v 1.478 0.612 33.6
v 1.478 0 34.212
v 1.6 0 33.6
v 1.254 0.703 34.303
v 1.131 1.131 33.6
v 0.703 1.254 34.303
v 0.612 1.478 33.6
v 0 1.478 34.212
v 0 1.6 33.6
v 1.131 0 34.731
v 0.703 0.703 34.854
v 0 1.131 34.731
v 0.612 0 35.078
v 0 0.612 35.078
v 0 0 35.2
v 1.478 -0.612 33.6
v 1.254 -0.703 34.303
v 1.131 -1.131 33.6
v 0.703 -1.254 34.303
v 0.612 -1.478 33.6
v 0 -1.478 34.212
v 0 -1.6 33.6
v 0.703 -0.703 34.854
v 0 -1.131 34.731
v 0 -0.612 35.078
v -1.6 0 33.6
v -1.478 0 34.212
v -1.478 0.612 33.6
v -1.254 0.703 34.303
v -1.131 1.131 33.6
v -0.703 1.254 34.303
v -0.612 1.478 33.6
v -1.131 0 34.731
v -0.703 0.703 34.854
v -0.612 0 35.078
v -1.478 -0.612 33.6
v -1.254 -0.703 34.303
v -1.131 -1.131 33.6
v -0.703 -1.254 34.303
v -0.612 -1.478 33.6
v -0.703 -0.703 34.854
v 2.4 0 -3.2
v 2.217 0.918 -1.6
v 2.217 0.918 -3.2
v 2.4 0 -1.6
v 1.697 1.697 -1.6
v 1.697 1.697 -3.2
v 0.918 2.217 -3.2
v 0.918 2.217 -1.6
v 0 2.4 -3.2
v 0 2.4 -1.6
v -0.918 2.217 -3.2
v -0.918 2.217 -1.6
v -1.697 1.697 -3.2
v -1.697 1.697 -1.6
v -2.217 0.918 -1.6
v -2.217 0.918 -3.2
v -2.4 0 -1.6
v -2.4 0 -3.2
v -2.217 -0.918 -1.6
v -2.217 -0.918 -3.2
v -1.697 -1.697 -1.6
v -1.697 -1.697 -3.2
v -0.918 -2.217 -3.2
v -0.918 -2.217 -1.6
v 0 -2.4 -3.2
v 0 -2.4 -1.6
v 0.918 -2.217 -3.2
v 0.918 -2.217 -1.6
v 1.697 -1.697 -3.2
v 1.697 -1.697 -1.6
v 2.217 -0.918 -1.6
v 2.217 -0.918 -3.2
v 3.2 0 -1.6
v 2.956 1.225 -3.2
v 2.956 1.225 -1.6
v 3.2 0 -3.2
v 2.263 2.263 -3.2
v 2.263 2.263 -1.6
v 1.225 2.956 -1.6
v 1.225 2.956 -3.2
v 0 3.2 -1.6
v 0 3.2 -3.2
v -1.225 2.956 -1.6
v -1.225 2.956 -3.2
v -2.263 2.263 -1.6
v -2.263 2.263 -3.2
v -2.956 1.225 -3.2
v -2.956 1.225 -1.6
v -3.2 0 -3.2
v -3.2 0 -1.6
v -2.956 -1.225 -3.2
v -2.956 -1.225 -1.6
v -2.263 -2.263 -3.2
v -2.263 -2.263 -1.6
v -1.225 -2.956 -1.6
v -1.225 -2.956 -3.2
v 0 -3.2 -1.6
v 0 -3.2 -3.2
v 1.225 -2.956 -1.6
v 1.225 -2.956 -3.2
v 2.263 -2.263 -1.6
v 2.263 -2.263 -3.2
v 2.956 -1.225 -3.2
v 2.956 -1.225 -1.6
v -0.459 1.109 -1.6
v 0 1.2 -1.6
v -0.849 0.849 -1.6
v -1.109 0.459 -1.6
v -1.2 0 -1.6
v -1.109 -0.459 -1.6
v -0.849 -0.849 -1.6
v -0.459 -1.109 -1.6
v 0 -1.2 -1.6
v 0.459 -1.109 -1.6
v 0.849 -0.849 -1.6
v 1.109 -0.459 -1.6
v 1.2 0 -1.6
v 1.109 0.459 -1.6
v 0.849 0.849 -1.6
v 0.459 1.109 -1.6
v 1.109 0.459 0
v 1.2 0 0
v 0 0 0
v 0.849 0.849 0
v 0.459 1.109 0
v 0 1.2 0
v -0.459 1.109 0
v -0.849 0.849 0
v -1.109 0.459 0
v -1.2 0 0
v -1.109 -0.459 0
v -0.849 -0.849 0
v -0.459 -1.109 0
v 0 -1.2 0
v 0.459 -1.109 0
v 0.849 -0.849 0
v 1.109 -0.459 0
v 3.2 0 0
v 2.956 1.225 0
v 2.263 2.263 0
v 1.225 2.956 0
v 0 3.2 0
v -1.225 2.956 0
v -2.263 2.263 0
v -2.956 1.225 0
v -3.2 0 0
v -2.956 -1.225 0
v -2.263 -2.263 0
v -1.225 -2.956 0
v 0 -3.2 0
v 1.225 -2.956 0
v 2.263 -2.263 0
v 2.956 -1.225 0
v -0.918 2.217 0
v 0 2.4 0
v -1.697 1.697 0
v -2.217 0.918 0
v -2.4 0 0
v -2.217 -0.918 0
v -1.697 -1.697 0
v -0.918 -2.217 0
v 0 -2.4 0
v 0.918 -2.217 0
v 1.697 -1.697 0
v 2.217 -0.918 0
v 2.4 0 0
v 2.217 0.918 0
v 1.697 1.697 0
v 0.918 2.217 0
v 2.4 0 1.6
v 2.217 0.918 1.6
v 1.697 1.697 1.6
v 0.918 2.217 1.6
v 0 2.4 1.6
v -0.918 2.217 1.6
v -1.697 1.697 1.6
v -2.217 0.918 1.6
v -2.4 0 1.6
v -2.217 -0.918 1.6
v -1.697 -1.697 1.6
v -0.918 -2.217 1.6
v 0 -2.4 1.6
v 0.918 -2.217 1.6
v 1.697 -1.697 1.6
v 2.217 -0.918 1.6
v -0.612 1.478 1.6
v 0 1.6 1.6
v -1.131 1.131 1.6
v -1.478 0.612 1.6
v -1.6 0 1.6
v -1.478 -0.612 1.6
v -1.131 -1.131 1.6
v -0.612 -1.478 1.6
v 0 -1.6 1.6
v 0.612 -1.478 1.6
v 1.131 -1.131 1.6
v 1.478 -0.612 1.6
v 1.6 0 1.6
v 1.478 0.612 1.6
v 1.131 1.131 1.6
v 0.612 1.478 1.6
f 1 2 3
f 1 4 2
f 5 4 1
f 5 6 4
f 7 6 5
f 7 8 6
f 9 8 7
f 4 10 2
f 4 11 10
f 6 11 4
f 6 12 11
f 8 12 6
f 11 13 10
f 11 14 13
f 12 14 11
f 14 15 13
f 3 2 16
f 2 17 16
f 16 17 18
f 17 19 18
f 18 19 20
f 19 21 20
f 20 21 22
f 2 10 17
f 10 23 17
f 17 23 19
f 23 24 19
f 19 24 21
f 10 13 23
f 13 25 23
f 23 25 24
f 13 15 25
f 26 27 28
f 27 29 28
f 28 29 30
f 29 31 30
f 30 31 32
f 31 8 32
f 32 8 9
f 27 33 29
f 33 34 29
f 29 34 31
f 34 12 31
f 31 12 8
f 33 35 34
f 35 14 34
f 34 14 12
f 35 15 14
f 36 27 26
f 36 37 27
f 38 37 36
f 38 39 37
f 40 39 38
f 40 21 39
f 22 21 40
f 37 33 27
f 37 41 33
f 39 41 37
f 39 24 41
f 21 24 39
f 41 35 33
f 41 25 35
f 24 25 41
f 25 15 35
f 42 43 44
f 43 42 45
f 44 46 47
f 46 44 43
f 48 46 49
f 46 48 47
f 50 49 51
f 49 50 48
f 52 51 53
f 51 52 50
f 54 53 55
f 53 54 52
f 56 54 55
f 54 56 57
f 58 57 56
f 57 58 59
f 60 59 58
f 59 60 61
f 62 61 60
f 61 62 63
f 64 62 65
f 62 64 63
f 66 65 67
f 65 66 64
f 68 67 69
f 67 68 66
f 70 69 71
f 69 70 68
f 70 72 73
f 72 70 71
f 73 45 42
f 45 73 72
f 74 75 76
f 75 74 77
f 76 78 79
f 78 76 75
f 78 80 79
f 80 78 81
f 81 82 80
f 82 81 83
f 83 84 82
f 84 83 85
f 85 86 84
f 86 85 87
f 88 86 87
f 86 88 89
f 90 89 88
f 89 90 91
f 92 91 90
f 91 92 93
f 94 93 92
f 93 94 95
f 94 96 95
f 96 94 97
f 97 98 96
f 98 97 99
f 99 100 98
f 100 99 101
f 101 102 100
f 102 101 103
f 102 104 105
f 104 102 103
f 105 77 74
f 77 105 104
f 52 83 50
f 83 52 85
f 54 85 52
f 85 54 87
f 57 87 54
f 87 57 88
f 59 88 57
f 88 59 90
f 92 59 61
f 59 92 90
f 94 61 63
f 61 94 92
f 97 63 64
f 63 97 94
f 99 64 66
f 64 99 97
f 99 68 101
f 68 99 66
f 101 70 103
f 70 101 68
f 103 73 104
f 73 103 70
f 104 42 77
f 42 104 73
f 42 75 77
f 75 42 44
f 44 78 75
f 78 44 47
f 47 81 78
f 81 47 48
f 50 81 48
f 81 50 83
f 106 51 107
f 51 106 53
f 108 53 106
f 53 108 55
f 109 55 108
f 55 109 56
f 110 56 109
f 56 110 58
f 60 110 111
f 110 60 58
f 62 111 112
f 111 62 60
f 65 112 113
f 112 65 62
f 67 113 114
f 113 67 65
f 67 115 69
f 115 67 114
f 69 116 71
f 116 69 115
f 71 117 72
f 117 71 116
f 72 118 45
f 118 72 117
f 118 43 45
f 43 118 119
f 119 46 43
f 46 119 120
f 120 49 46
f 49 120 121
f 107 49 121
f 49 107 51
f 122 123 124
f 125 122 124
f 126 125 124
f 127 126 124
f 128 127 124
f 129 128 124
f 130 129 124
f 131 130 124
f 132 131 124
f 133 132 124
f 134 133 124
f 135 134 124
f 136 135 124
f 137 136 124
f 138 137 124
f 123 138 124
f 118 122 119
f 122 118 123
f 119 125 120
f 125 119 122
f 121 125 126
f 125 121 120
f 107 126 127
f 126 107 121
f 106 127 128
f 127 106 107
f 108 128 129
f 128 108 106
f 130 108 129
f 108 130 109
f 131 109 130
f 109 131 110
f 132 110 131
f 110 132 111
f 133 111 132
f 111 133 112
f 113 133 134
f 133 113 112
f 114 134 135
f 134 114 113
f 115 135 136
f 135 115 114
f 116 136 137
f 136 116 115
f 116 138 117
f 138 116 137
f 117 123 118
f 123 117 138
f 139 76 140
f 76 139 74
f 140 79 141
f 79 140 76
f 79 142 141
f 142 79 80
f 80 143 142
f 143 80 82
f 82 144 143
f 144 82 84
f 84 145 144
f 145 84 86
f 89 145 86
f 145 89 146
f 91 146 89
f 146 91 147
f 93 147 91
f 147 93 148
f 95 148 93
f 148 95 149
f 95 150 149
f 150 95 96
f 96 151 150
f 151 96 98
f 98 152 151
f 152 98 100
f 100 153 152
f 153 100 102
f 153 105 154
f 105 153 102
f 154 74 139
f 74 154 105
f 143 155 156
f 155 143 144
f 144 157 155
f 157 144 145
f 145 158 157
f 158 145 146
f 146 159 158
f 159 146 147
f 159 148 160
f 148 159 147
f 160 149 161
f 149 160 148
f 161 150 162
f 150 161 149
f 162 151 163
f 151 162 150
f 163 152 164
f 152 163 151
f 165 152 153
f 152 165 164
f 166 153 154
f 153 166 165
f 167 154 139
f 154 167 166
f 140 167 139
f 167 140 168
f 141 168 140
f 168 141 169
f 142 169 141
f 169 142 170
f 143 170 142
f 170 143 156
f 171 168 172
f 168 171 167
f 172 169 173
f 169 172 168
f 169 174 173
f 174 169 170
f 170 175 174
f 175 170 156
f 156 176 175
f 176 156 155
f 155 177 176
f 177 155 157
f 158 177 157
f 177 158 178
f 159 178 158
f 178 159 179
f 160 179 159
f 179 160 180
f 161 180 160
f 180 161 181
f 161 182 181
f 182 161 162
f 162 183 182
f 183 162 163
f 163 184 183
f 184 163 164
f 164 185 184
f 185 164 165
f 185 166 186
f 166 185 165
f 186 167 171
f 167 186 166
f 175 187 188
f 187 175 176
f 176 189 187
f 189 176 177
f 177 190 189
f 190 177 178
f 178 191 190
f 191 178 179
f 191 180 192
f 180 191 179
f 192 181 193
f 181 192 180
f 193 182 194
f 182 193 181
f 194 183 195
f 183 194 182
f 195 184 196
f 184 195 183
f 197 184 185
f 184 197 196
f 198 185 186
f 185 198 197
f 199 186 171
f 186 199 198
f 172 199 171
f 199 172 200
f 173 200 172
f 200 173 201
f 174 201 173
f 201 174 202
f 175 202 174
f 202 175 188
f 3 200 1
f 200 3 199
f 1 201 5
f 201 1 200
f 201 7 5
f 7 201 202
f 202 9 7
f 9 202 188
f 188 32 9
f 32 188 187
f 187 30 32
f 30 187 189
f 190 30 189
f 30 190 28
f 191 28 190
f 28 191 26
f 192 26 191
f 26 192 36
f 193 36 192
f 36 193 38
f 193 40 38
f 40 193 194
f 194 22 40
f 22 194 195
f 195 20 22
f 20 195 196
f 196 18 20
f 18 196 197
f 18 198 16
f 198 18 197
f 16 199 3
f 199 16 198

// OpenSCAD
// file: ../p/1-8sphe.scad
use <../lib.scad>
function ldraw_lib__1_8sphe() = [
// 0 Sphere 0.125
// 0 Name: 1-8sphe.dat
// 0 Author: James Jessiman
// 0 !LDRAW_ORG Primitive UPDATE 2012-03
// 0 !LICENSE Licensed under CC BY 2.0 and CC BY 4.0 : see CAreadme.txt
// 
// 0 BFC CERTIFY CCW
  [0,"BFC","CERTIFY"],
  [0,"BFC","CCW"],
// 
// 0 !HISTORY 2000-08-01 {Axel Poque} fixes to resolve L3P error messages.
// 0 !HISTORY 2000-08-01 {Manfred Moolhuysen} fixes to resolve L3P error messages.
// 0 !HISTORY 2000-09-30 [PTadmin] Official Update 2000-02
// 0 !HISTORY 2002-03-28 [hafhead] Made BFC compliant
// 0 !HISTORY 2002-04-25 [PTadmin] Official Update 2002-02
// 0 !HISTORY 2007-06-22 [PTadmin] Header formatted for Contributor Agreement
// 0 !HISTORY 2008-07-01 [PTadmin] Official Update 2008-01
// 0 !HISTORY 2010-09-12 [MagFors] Changed winding, removed duplicated cond-line, optimized filesize
// 0 !HISTORY 2010-12-31 [PTadmin] Official Update 2010-03
// 0 !HISTORY 2012-07-01 [tcobbs] Replaced with geometry from LDView
// 0 !HISTORY 2012-12-28 [PTadmin] Official Update 2012-03
// 
// 
// 3 16 1 0 0 0.9239 0.3827 0 0.9239 0 0.3827
  [3,16,1,0,0,0.9239,0.3827,0,0.9239,0,0.3827],
// 3 16 0.9239 0.3827 0 0.7836 0.4393 0.4393 0.9239 0 0.3827
  [3,16,0.9239,0.3827,0,0.7836,0.4393,0.4393,0.9239,0,0.3827],
// 3 16 0.9239 0 0.3827 0.7836 0.4393 0.4393 0.7071 0 0.7071
  [3,16,0.9239,0,0.3827,0.7836,0.4393,0.4393,0.7071,0,0.7071],
// 3 16 0.7836 0.4393 0.4393 0.4393 0.4393 0.7836 0.7071 0 0.7071
  [3,16,0.7836,0.4393,0.4393,0.4393,0.4393,0.7836,0.7071,0,0.7071],
// 3 16 0.7071 0 0.7071 0.4393 0.4393 0.7836 0.3827 0 0.9239
  [3,16,0.7071,0,0.7071,0.4393,0.4393,0.7836,0.3827,0,0.9239],
// 3 16 0.4393 0.4393 0.7836 0 0.3827 0.9239 0.3827 0 0.9239
  [3,16,0.4393,0.4393,0.7836,0,0.3827,0.9239,0.3827,0,0.9239],
// 3 16 0.3827 0 0.9239 0 0.3827 0.9239 0 0 1
  [3,16,0.3827,0,0.9239,0,0.3827,0.9239,0,0,1],
// 3 16 0.9239 0.3827 0 0.7071 0.7071 0 0.7836 0.4393 0.4393
  [3,16,0.9239,0.3827,0,0.7071,0.7071,0,0.7836,0.4393,0.4393],
// 3 16 0.7071 0.7071 0 0.4393 0.7836 0.4393 0.7836 0.4393 0.4393
  [3,16,0.7071,0.7071,0,0.4393,0.7836,0.4393,0.7836,0.4393,0.4393],
// 3 16 0.7836 0.4393 0.4393 0.4393 0.7836 0.4393 0.4393 0.4393 0.7836
  [3,16,0.7836,0.4393,0.4393,0.4393,0.7836,0.4393,0.4393,0.4393,0.7836],
// 3 16 0.4393 0.7836 0.4393 0 0.7071 0.7071 0.4393 0.4393 0.7836
  [3,16,0.4393,0.7836,0.4393,0,0.7071,0.7071,0.4393,0.4393,0.7836],
// 3 16 0.4393 0.4393 0.7836 0 0.7071 0.7071 0 0.3827 0.9239
  [3,16,0.4393,0.4393,0.7836,0,0.7071,0.7071,0,0.3827,0.9239],
// 3 16 0.7071 0.7071 0 0.3827 0.9239 0 0.4393 0.7836 0.4393
  [3,16,0.7071,0.7071,0,0.3827,0.9239,0,0.4393,0.7836,0.4393],
// 3 16 0.3827 0.9239 0 0 0.9239 0.3827 0.4393 0.7836 0.4393
  [3,16,0.3827,0.9239,0,0,0.9239,0.3827,0.4393,0.7836,0.4393],
// 3 16 0.4393 0.7836 0.4393 0 0.9239 0.3827 0 0.7071 0.7071
  [3,16,0.4393,0.7836,0.4393,0,0.9239,0.3827,0,0.7071,0.7071],
// 3 16 0.3827 0.9239 0 0 1 0 0 0.9239 0.3827
  [3,16,0.3827,0.9239,0,0,1,0,0,0.9239,0.3827],
// 
// 5 24 1 0 0 0.9239 0.3827 0 1 0 -0.1 0.9239 0 0.3827
  [5,24,1,0,0,0.9239,0.3827,0,1,0,-0.1,0.9239,0,0.3827],
// 5 24 0.9239 0.3827 0 0.9239 0 0.3827 1 0 0 0.7836 0.4393 0.4393
  [5,24,0.9239,0.3827,0,0.9239,0,0.3827,1,0,0,0.7836,0.4393,0.4393],
// 5 24 1 0 0 0.9239 0 0.3827 0.9239 0.3827 0 1 -0.1 0
  [5,24,1,0,0,0.9239,0,0.3827,0.9239,0.3827,0,1,-0.1,0],
// 5 24 0.9239 0 0.3827 0.7836 0.4393 0.4393 0.9239 0.3827 0 0.7071 0 0.7071
  [5,24,0.9239,0,0.3827,0.7836,0.4393,0.4393,0.9239,0.3827,0,0.7071,0,0.7071],
// 5 24 0.7836 0.4393 0.4393 0.7071 0 0.7071 0.9239 0 0.3827 0.4393 0.4393 0.7836
  [5,24,0.7836,0.4393,0.4393,0.7071,0,0.7071,0.9239,0,0.3827,0.4393,0.4393,0.7836],
// 5 24 0.9239 0 0.3827 0.7071 0 0.7071 0.7836 0.4393 0.4393 0.9239 -0.1 0.3827
  [5,24,0.9239,0,0.3827,0.7071,0,0.7071,0.7836,0.4393,0.4393,0.9239,-0.1,0.3827],
// 5 24 0.7071 0 0.7071 0.4393 0.4393 0.7836 0.7836 0.4393 0.4393 0.3827 0 0.9239
  [5,24,0.7071,0,0.7071,0.4393,0.4393,0.7836,0.7836,0.4393,0.4393,0.3827,0,0.9239],
// 5 24 0.4393 0.4393 0.7836 0.3827 0 0.9239 0.7071 0 0.7071 0 0.3827 0.9239
  [5,24,0.4393,0.4393,0.7836,0.3827,0,0.9239,0.7071,0,0.7071,0,0.3827,0.9239],
// 5 24 0.7071 0 0.7071 0.3827 0 0.9239 0.4393 0.4393 0.7836 0.7071 -0.1 0.7071
  [5,24,0.7071,0,0.7071,0.3827,0,0.9239,0.4393,0.4393,0.7836,0.7071,-0.1,0.7071],
// 5 24 0.3827 0 0.9239 0 0.3827 0.9239 0.4393 0.4393 0.7836 0 0 1
  [5,24,0.3827,0,0.9239,0,0.3827,0.9239,0.4393,0.4393,0.7836,0,0,1],
// 5 24 0 0.3827 0.9239 0 0 1 0.3827 0 0.9239 -0.1 0.3827 0.9239
  [5,24,0,0.3827,0.9239,0,0,1,0.3827,0,0.9239,-0.1,0.3827,0.9239],
// 5 24 0.3827 0 0.9239 0 0 1 0 0.3827 0.9239 0.3827 -0.1 0.9239
  [5,24,0.3827,0,0.9239,0,0,1,0,0.3827,0.9239,0.3827,-0.1,0.9239],
// 5 24 0.9239 0.3827 0 0.7071 0.7071 0 0.9239 0.3827 -0.1 0.7836 0.4393 0.4393
  [5,24,0.9239,0.3827,0,0.7071,0.7071,0,0.9239,0.3827,-0.1,0.7836,0.4393,0.4393],
// 5 24 0.7071 0.7071 0 0.7836 0.4393 0.4393 0.9239 0.3827 0 0.4393 0.7836 0.4393
  [5,24,0.7071,0.7071,0,0.7836,0.4393,0.4393,0.9239,0.3827,0,0.4393,0.7836,0.4393],
// 5 24 0.9239 0.3827 0 0.7836 0.4393 0.4393 0.7071 0.7071 0 0.9239 0 0.3827
  [5,24,0.9239,0.3827,0,0.7836,0.4393,0.4393,0.7071,0.7071,0,0.9239,0,0.3827],
// 5 24 0.7836 0.4393 0.4393 0.4393 0.7836 0.4393 0.7071 0.7071 0 0.4393 0.4393 0.7836
  [5,24,0.7836,0.4393,0.4393,0.4393,0.7836,0.4393,0.7071,0.7071,0,0.4393,0.4393,0.7836],
// 5 24 0.4393 0.7836 0.4393 0.4393 0.4393 0.7836 0.7836 0.4393 0.4393 0 0.7071 0.7071
  [5,24,0.4393,0.7836,0.4393,0.4393,0.4393,0.7836,0.7836,0.4393,0.4393,0,0.7071,0.7071],
// 5 24 0.7836 0.4393 0.4393 0.4393 0.4393 0.7836 0.4393 0.7836 0.4393 0.7071 0 0.7071
  [5,24,0.7836,0.4393,0.4393,0.4393,0.4393,0.7836,0.4393,0.7836,0.4393,0.7071,0,0.7071],
// 5 24 0.4393 0.4393 0.7836 0 0.7071 0.7071 0.4393 0.7836 0.4393 0 0.3827 0.9239
  [5,24,0.4393,0.4393,0.7836,0,0.7071,0.7071,0.4393,0.7836,0.4393,0,0.3827,0.9239],
// 5 24 0 0.7071 0.7071 0 0.3827 0.9239 0.4393 0.4393 0.7836 -0.1 0.7071 0.7071
  [5,24,0,0.7071,0.7071,0,0.3827,0.9239,0.4393,0.4393,0.7836,-0.1,0.7071,0.7071],
// 5 24 0.4393 0.4393 0.7836 0 0.3827 0.9239 0 0.7071 0.7071 0.3827 0 0.9239
  [5,24,0.4393,0.4393,0.7836,0,0.3827,0.9239,0,0.7071,0.7071,0.3827,0,0.9239],
// 5 24 0.7071 0.7071 0 0.3827 0.9239 0 0.7071 0.7071 -0.1 0.4393 0.7836 0.4393
  [5,24,0.7071,0.7071,0,0.3827,0.9239,0,0.7071,0.7071,-0.1,0.4393,0.7836,0.4393],
// 5 24 0.3827 0.9239 0 0.4393 0.7836 0.4393 0.7071 0.7071 0 0 0.9239 0.3827
  [5,24,0.3827,0.9239,0,0.4393,0.7836,0.4393,0.7071,0.7071,0,0,0.9239,0.3827],
// 5 24 0.7071 0.7071 0 0.4393 0.7836 0.4393 0.3827 0.9239 0 0.7836 0.4393 0.4393
  [5,24,0.7071,0.7071,0,0.4393,0.7836,0.4393,0.3827,0.9239,0,0.7836,0.4393,0.4393],
// 5 24 0.4393 0.7836 0.4393 0 0.9239 0.3827 0.3827 0.9239 0 0 0.7071 0.7071
  [5,24,0.4393,0.7836,0.4393,0,0.9239,0.3827,0.3827,0.9239,0,0,0.7071,0.7071],
// 5 24 0 0.9239 0.3827 0 0.7071 0.7071 0.4393 0.7836 0.4393 -0.1 0.9239 0.3827
  [5,24,0,0.9239,0.3827,0,0.7071,0.7071,0.4393,0.7836,0.4393,-0.1,0.9239,0.3827],
// 5 24 0.4393 0.7836 0.4393 0 0.7071 0.7071 0 0.9239 0.3827 0.4393 0.4393 0.7836
  [5,24,0.4393,0.7836,0.4393,0,0.7071,0.7071,0,0.9239,0.3827,0.4393,0.4393,0.7836],
// 5 24 0.3827 0.9239 0 0 1 0 0.3827 0.9239 -0.1 0 0.9239 0.3827
  [5,24,0.3827,0.9239,0,0,1,0,0.3827,0.9239,-0.1,0,0.9239,0.3827],
// 5 24 0 1 0 0 0.9239 0.3827 0.3827 0.9239 0 -0.1 1 0
  [5,24,0,1,0,0,0.9239,0.3827,0.3827,0.9239,0,-0.1,1,0],
// 5 24 0.3827 0.9239 0 0 0.9239 0.3827 0 1 0 0.4393 0.7836 0.4393
  [5,24,0.3827,0.9239,0,0,0.9239,0.3827,0,1,0,0.4393,0.7836,0.4393],
];
makepoly(ldraw_lib__1_8sphe(), line=0.2);
// file: ../p/4-4disc.scad
use <../lib.scad>
function ldraw_lib__4_4disc() = [
// 0 Disc 1.0
// 0 Name: 4-4disc.dat
// 0 Author: James Jessiman
// 0 !LDRAW_ORG Primitive UPDATE 2002-02
// 0 !LICENSE Licensed under CC BY 2.0 and CC BY 4.0 : see CAreadme.txt
// 
// 0 BFC CERTIFY CCW
  [0,"BFC","CERTIFY"],
  [0,"BFC","CCW"],
// 
// 0 !HISTORY 1998-12-15 [PTadmin] Official Update 1998-10
// 0 !HISTORY 2002-03-23 [sbliss] Added BFC statement
// 0 !HISTORY 2002-04-25 [PTadmin] Official Update 2002-02
// 0 !HISTORY 2007-06-24 [PTadmin] Header formatted for Contributor Agreement
// 0 !HISTORY 2008-07-01 [PTadmin] Official Update 2008-01
// 
// 
// 3 16 0 0 0 1 0 0 0.9239 0 0.3827
  [3,16,0,0,0,1,0,0,0.9239,0,0.3827],
// 3 16 0 0 0 0.9239 0 0.3827 0.7071 0 0.7071
  [3,16,0,0,0,0.9239,0,0.3827,0.7071,0,0.7071],
// 3 16 0 0 0 0.7071 0 0.7071 0.3827 0 0.9239
  [3,16,0,0,0,0.7071,0,0.7071,0.3827,0,0.9239],
// 3 16 0 0 0 0.3827 0 0.9239 0 0 1
  [3,16,0,0,0,0.3827,0,0.9239,0,0,1],
// 3 16 0 0 0 0 0 1 -0.3827 0 0.9239
  [3,16,0,0,0,0,0,1,-0.3827,0,0.9239],
// 3 16 0 0 0 -0.3827 0 0.9239 -0.7071 0 0.7071
  [3,16,0,0,0,-0.3827,0,0.9239,-0.7071,0,0.7071],
// 3 16 0 0 0 -0.7071 0 0.7071 -0.9239 0 0.3827
  [3,16,0,0,0,-0.7071,0,0.7071,-0.9239,0,0.3827],
// 3 16 0 0 0 -0.9239 0 0.3827 -1 0 -0
  [3,16,0,0,0,-0.9239,0,0.3827,-1,0,-0],
// 3 16 0 0 0 -1 0 -0 -0.9239 0 -0.3827
  [3,16,0,0,0,-1,0,-0,-0.9239,0,-0.3827],
// 3 16 0 0 0 -0.9239 0 -0.3827 -0.7071 0 -0.7071
  [3,16,0,0,0,-0.9239,0,-0.3827,-0.7071,0,-0.7071],
// 3 16 0 0 0 -0.7071 0 -0.7071 -0.3827 0 -0.9239
  [3,16,0,0,0,-0.7071,0,-0.7071,-0.3827,0,-0.9239],
// 3 16 0 0 0 -0.3827 0 -0.9239 0 0 -1
  [3,16,0,0,0,-0.3827,0,-0.9239,0,0,-1],
// 3 16 0 0 0 0 0 -1 0.3827 0 -0.9239
  [3,16,0,0,0,0,0,-1,0.3827,0,-0.9239],
// 3 16 0 0 0 0.3827 0 -0.9239 0.7071 0 -0.7071
  [3,16,0,0,0,0.3827,0,-0.9239,0.7071,0,-0.7071],
// 3 16 0 0 0 0.7071 0 -0.7071 0.9239 0 -0.3827
  [3,16,0,0,0,0.7071,0,-0.7071,0.9239,0,-0.3827],
// 3 16 0 0 0 0.9239 0 -0.3827 1 0 0
  [3,16,0,0,0,0.9239,0,-0.3827,1,0,0],
// 0
];
makepoly(ldraw_lib__4_4disc(), line=0.2);
// file: ../p/stud4a.scad
use <../lib.scad>
use <4-4cyli.scad>
use <4-4edge.scad>
use <4-4ring3.scad>
function ldraw_lib__stud4a() = [
// 0 Stud Tube Open without Base Edges
// 0 Name: stud4a.dat
// 0 Author: James Jessiman
// 0 !LDRAW_ORG Primitive UPDATE 2009-02
// 0 !LICENSE Licensed under CC BY 2.0 and CC BY 4.0 : see CAreadme.txt
// 
// 0 BFC CERTIFY CCW
  [0,"BFC","CERTIFY"],
  [0,"BFC","CCW"],
// 
// 0 !HISTORY 1999-07-05 [PTadmin] Official Update 1999-05
// 0 !HISTORY 2002-04-04 [sbliss] Modified for BFC compliance
// 0 !HISTORY 2002-04-25 [PTadmin] Official Update 2002-02
// 0 !HISTORY 2007-06-24 [PTadmin] Header formatted for Contributor Agreement
// 0 !HISTORY 2008-07-01 [PTadmin] Official Update 2008-01
// 0 !HISTORY 2009-06-21 [cwdee] Update ring references to 4-4ring
// 0 !HISTORY 2009-09-03 [PTadmin] Official Update 2009-02
// 
// 
// 1 16 0 -4 0 6 0 0 0 1 0 0 0 6 4-4edge.dat
  [1,16,0,-4,0,6,0,0,0,1,0,0,0,6, ldraw_lib__4_4edge()],
// 1 16 0 -4 0 8 0 0 0 1 0 0 0 8 4-4edge.dat
  [1,16,0,-4,0,8,0,0,0,1,0,0,0,8, ldraw_lib__4_4edge()],
// 0 BFC INVERTNEXT
  [0,"BFC","INVERTNEXT"],
// 1 16 0 -4 0 6 0 0 0 4 0 0 0 6 4-4cyli.dat
  [1,16,0,-4,0,6,0,0,0,4,0,0,0,6, ldraw_lib__4_4cyli()],
// 1 16 0 -4 0 8 0 0 0 4 0 0 0 8 4-4cyli.dat
  [1,16,0,-4,0,8,0,0,0,4,0,0,0,8, ldraw_lib__4_4cyli()],
// 1 16 0 -4 0 2 0 0 0 1 0 0 0 2 4-4ring3.dat
  [1,16,0,-4,0,2,0,0,0,1,0,0,0,2, ldraw_lib__4_4ring3()],
// 0
];
makepoly(ldraw_lib__stud4a(), line=0.2);
// file: ../p/4-8sphe.scad
use <../lib.scad>
use <1-8sphe.scad>
function ldraw_lib__4_8sphe() = [
// 0 Sphere 0.5
// 0 Name: 4-8sphe.dat
// 0 Author: James Jessiman
// 0 !LDRAW_ORG Primitive UPDATE 2003-02
// 0 !LICENSE Licensed under CC BY 2.0 and CC BY 4.0 : see CAreadme.txt
// 
// 0 BFC CERTIFY CCW
  [0,"BFC","CERTIFY"],
  [0,"BFC","CCW"],
// 
// 0 !HISTORY 2002-08-31 [izanette] Modified with WINDZ for BFC compliance
// 0 !HISTORY 2003-08-01 [PTadmin] Official Update 2003-02
// 0 !HISTORY 2007-06-24 [PTadmin] Header formatted for Contributor Agreement
// 0 !HISTORY 2008-07-01 [PTadmin] Official Update 2008-01
// 
// 
// 1 16 0 0 0 1 0 0 0 1 0 0 0 1 1-8sphe.dat
  [1,16,0,0,0,1,0,0,0,1,0,0,0,1, ldraw_lib__1_8sphe()],
// 1 16 0 0 0 1 0 0 0 1 0 0 0 -1 1-8sphe.dat
  [1,16,0,0,0,1,0,0,0,1,0,0,0,-1, ldraw_lib__1_8sphe()],
// 1 16 0 0 0 -1 0 0 0 1 0 0 0 1 1-8sphe.dat
  [1,16,0,0,0,-1,0,0,0,1,0,0,0,1, ldraw_lib__1_8sphe()],
// 1 16 0 0 0 -1 0 0 0 1 0 0 0 -1 1-8sphe.dat
  [1,16,0,0,0,-1,0,0,0,1,0,0,0,-1, ldraw_lib__1_8sphe()],
// 0
// 
];
makepoly(ldraw_lib__4_8sphe(), line=0.2);
// file: ../p/4-4ring3.scad
use <../lib.scad>
function ldraw_lib__4_4ring3() = [
// 0 Ring  3 x 1.0
// 0 Name: 4-4ring3.dat
// 0 Author: James Jessiman
// 0 !LDRAW_ORG Primitive UPDATE 2009-01
// 0 !LICENSE Licensed under CC BY 2.0 and CC BY 4.0 : see CAreadme.txt
// 
// 0 BFC CERTIFY CCW
  [0,"BFC","CERTIFY"],
  [0,"BFC","CCW"],
// 
// 0 !HISTORY 1998-12-15 [PTadmin] Official Update 1998-10
// 0 !HISTORY 2002-04-05 [hafhead] Added BFC statement
// 0 !HISTORY 2002-04-25 [PTadmin] Official Update 2002-02
// 0 !HISTORY 2007-06-24 [PTadmin] Header formatted for Contributor Agreement
// 0 !HISTORY 2008-07-01 [PTadmin] Official Update 2008-01
// 0 !HISTORY 2008-08-26 [cwdee] Switch polygon winding and rename
// 0 !HISTORY 2009-05-02 [PTadmin] Official Update 2009-01
// 
// 
// 4 16 -1.5308 0 3.6956 -1.1481 0 2.7717 0 0 3 0 0 4
  [4,16,-1.5308,0,3.6956,-1.1481,0,2.7717,0,0,3,0,0,4],
// 4 16 -2.8284 0 2.8284 -2.1213 0 2.1213 -1.1481 0 2.7717 -1.5308 0 3.6956
  [4,16,-2.8284,0,2.8284,-2.1213,0,2.1213,-1.1481,0,2.7717,-1.5308,0,3.6956],
// 4 16 -3.6956 0 1.5308 -2.7717 0 1.1481 -2.1213 0 2.1213 -2.8284 0 2.8284
  [4,16,-3.6956,0,1.5308,-2.7717,0,1.1481,-2.1213,0,2.1213,-2.8284,0,2.8284],
// 4 16 -4 0 0 -3 0 0 -2.7717 0 1.1481 -3.6956 0 1.5308
  [4,16,-4,0,0,-3,0,0,-2.7717,0,1.1481,-3.6956,0,1.5308],
// 4 16 -3.6956 0 -1.5308 -2.7717 0 -1.1481 -3 0 0 -4 0 0
  [4,16,-3.6956,0,-1.5308,-2.7717,0,-1.1481,-3,0,0,-4,0,0],
// 4 16 -2.8284 0 -2.8284 -2.1213 0 -2.1213 -2.7717 0 -1.1481 -3.6956 0 -1.5308
  [4,16,-2.8284,0,-2.8284,-2.1213,0,-2.1213,-2.7717,0,-1.1481,-3.6956,0,-1.5308],
// 4 16 -1.5308 0 -3.6956 -1.1481 0 -2.7717 -2.1213 0 -2.1213 -2.8284 0 -2.8284
  [4,16,-1.5308,0,-3.6956,-1.1481,0,-2.7717,-2.1213,0,-2.1213,-2.8284,0,-2.8284],
// 4 16 0 0 -4 0 0 -3 -1.1481 0 -2.7717 -1.5308 0 -3.6956
  [4,16,0,0,-4,0,0,-3,-1.1481,0,-2.7717,-1.5308,0,-3.6956],
// 4 16 1.5308 0 -3.6956 1.1481 0 -2.7717 0 0 -3 0 0 -4
  [4,16,1.5308,0,-3.6956,1.1481,0,-2.7717,0,0,-3,0,0,-4],
// 4 16 2.8284 0 -2.8284 2.1213 0 -2.1213 1.1481 0 -2.7717 1.5308 0 -3.6956
  [4,16,2.8284,0,-2.8284,2.1213,0,-2.1213,1.1481,0,-2.7717,1.5308,0,-3.6956],
// 4 16 3.6956 0 -1.5308 2.7717 0 -1.1481 2.1213 0 -2.1213 2.8284 0 -2.8284
  [4,16,3.6956,0,-1.5308,2.7717,0,-1.1481,2.1213,0,-2.1213,2.8284,0,-2.8284],
// 4 16 4 0 0 3 0 0 2.7717 0 -1.1481 3.6956 0 -1.5308
  [4,16,4,0,0,3,0,0,2.7717,0,-1.1481,3.6956,0,-1.5308],
// 4 16 3.6956 0 1.5308 2.7717 0 1.1481 3 0 0 4 0 0
  [4,16,3.6956,0,1.5308,2.7717,0,1.1481,3,0,0,4,0,0],
// 4 16 2.8284 0 2.8284 2.1213 0 2.1213 2.7717 0 1.1481 3.6956 0 1.5308
  [4,16,2.8284,0,2.8284,2.1213,0,2.1213,2.7717,0,1.1481,3.6956,0,1.5308],
// 4 16 1.5308 0 3.6956 1.1481 0 2.7717 2.1213 0 2.1213 2.8284 0 2.8284
  [4,16,1.5308,0,3.6956,1.1481,0,2.7717,2.1213,0,2.1213,2.8284,0,2.8284],
// 4 16 0 0 4 0 0 3 1.1481 0 2.7717 1.5308 0 3.6956
  [4,16,0,0,4,0,0,3,1.1481,0,2.7717,1.5308,0,3.6956],
// 0
];
makepoly(ldraw_lib__4_4ring3(), line=0.2);
// file: ../p/4-4ring2.scad
use <../lib.scad>
function ldraw_lib__4_4ring2() = [
// 0 Ring  2 x 1.0
// 0 Name: 4-4ring2.dat
// 0 Author: James Jessiman
// 0 !LDRAW_ORG Primitive UPDATE 2009-01
// 0 !LICENSE Licensed under CC BY 2.0 and CC BY 4.0 : see CAreadme.txt
// 
// 0 BFC CERTIFY CCW
  [0,"BFC","CERTIFY"],
  [0,"BFC","CCW"],
// 
// 0 !HISTORY 1998-12-15 [PTadmin] Official Update 1998-10
// 0 !HISTORY 2002-04-05 [hafhead] Added BFC statement
// 0 !HISTORY 2002-04-25 [PTadmin] Official Update 2002-02
// 0 !HISTORY 2007-06-24 [PTadmin] Header formatted for Contributor Agreement
// 0 !HISTORY 2008-07-01 [PTadmin] Official Update 2008-01
// 0 !HISTORY 2008-08-26 [cwdee] Switch polygon winding and rename
// 0 !HISTORY 2009-05-02 [PTadmin] Official Update 2009-01
// 
// 
// 4 16 -1.1481 0 2.7717 -0.7654 0 1.8478 0 0 2 0 0 3
  [4,16,-1.1481,0,2.7717,-0.7654,0,1.8478,0,0,2,0,0,3],
// 4 16 -2.1213 0 2.1213 -1.4142 0 1.4142 -0.7654 0 1.8478 -1.1481 0 2.7717
  [4,16,-2.1213,0,2.1213,-1.4142,0,1.4142,-0.7654,0,1.8478,-1.1481,0,2.7717],
// 4 16 -2.7717 0 1.1481 -1.8478 0 0.7654 -1.4142 0 1.4142 -2.1213 0 2.1213
  [4,16,-2.7717,0,1.1481,-1.8478,0,0.7654,-1.4142,0,1.4142,-2.1213,0,2.1213],
// 4 16 -3 0 0 -2 0 0 -1.8478 0 0.7654 -2.7717 0 1.1481
  [4,16,-3,0,0,-2,0,0,-1.8478,0,0.7654,-2.7717,0,1.1481],
// 4 16 -2.7717 0 -1.1481 -1.8478 0 -0.7654 -2 0 0 -3 0 0
  [4,16,-2.7717,0,-1.1481,-1.8478,0,-0.7654,-2,0,0,-3,0,0],
// 4 16 -2.1213 0 -2.1213 -1.4142 0 -1.4142 -1.8478 0 -0.7654 -2.7717 0 -1.1481
  [4,16,-2.1213,0,-2.1213,-1.4142,0,-1.4142,-1.8478,0,-0.7654,-2.7717,0,-1.1481],
// 4 16 -1.1481 0 -2.7717 -0.7654 0 -1.8478 -1.4142 0 -1.4142 -2.1213 0 -2.1213
  [4,16,-1.1481,0,-2.7717,-0.7654,0,-1.8478,-1.4142,0,-1.4142,-2.1213,0,-2.1213],
// 4 16 0 0 -3 0 0 -2 -0.7654 0 -1.8478 -1.1481 0 -2.7717
  [4,16,0,0,-3,0,0,-2,-0.7654,0,-1.8478,-1.1481,0,-2.7717],
// 4 16 1.1481 0 -2.7717 0.7654 0 -1.8478 0 0 -2 0 0 -3
  [4,16,1.1481,0,-2.7717,0.7654,0,-1.8478,0,0,-2,0,0,-3],
// 4 16 2.1213 0 -2.1213 1.4142 0 -1.4142 0.7654 0 -1.8478 1.1481 0 -2.7717
  [4,16,2.1213,0,-2.1213,1.4142,0,-1.4142,0.7654,0,-1.8478,1.1481,0,-2.7717],
// 4 16 2.7717 0 -1.1481 1.8478 0 -0.7654 1.4142 0 -1.4142 2.1213 0 -2.1213
  [4,16,2.7717,0,-1.1481,1.8478,0,-0.7654,1.4142,0,-1.4142,2.1213,0,-2.1213],
// 4 16 3 0 0 2 0 0 1.8478 0 -0.7654 2.7717 0 -1.1481
  [4,16,3,0,0,2,0,0,1.8478,0,-0.7654,2.7717,0,-1.1481],
// 4 16 2.7717 0 1.1481 1.8478 0 0.7654 2 0 0 3 0 0
  [4,16,2.7717,0,1.1481,1.8478,0,0.7654,2,0,0,3,0,0],
// 4 16 2.1213 0 2.1213 1.4142 0 1.4142 1.8478 0 0.7654 2.7717 0 1.1481
  [4,16,2.1213,0,2.1213,1.4142,0,1.4142,1.8478,0,0.7654,2.7717,0,1.1481],
// 4 16 1.1481 0 2.7717 0.7654 0 1.8478 1.4142 0 1.4142 2.1213 0 2.1213
  [4,16,1.1481,0,2.7717,0.7654,0,1.8478,1.4142,0,1.4142,2.1213,0,2.1213],
// 4 16 0 0 3 0 0 2 0.7654 0 1.8478 1.1481 0 2.7717
  [4,16,0,0,3,0,0,2,0.7654,0,1.8478,1.1481,0,2.7717],
// 0
];
makepoly(ldraw_lib__4_4ring2(), line=0.2);
// file: ../p/4-4ring1.scad
use <../lib.scad>
function ldraw_lib__4_4ring1() = [
// 0 Ring  1 x 1.0
// 0 Name: 4-4ring1.dat
// 0 Author: James Jessiman
// 0 !LDRAW_ORG Primitive UPDATE 2009-01
// 0 !LICENSE Licensed under CC BY 2.0 and CC BY 4.0 : see CAreadme.txt
// 
// 0 BFC CERTIFY CCW
  [0,"BFC","CERTIFY"],
  [0,"BFC","CCW"],
// 
// 0 !HISTORY 1998-12-15 [PTadmin] Official Update 1998-10
// 0 !HISTORY 2002-04-08 [BrickCaster] Modified for BFC compliance
// 0 !HISTORY 2002-04-25 [PTadmin] Official Update 2002-02
// 0 !HISTORY 2007-06-24 [PTadmin] Header formatted for Contributor Agreement
// 0 !HISTORY 2008-07-01 [PTadmin] Official Update 2008-01
// 0 !HISTORY 2008-08-26 [cwdee] Switch polygon winding and rename
// 0 !HISTORY 2009-05-02 [PTadmin] Official Update 2009-01
// 
// 
// 4 16 -0.7654 0 1.8478 -0.3827 0 0.9239 0 0 1 0 0 2
  [4,16,-0.7654,0,1.8478,-0.3827,0,0.9239,0,0,1,0,0,2],
// 4 16 -1.4142 0 1.4142 -0.7071 0 0.7071 -0.3827 0 0.9239 -0.7654 0 1.8478
  [4,16,-1.4142,0,1.4142,-0.7071,0,0.7071,-0.3827,0,0.9239,-0.7654,0,1.8478],
// 4 16 -1.8478 0 0.7654 -0.9239 0 0.3827 -0.7071 0 0.7071 -1.4142 0 1.41420
  [4,16,-1.8478,0,0.7654,-0.9239,0,0.3827,-0.7071,0,0.7071,-1.4142,0,1.41420],
// 4 16 -2 0 0 -1 0 0 -0.9239 0 0.3827 -1.8478 0 0.7654
  [4,16,-2,0,0,-1,0,0,-0.9239,0,0.3827,-1.8478,0,0.7654],
// 4 16 -1.8478 0 -0.7654 -0.9239 0 -0.3827 -1 0 0 -2 0 0
  [4,16,-1.8478,0,-0.7654,-0.9239,0,-0.3827,-1,0,0,-2,0,0],
// 4 16 -1.4142 0 -1.4142 -0.7071 0 -0.7071 -0.9239 0 -0.3827 -1.8478 0 -0.7654
  [4,16,-1.4142,0,-1.4142,-0.7071,0,-0.7071,-0.9239,0,-0.3827,-1.8478,0,-0.7654],
// 4 16 -0.7654 0 -1.8478 -0.3827 0 -0.9239 -0.7071 0 -0.7071 -1.4142 0 -1.4142
  [4,16,-0.7654,0,-1.8478,-0.3827,0,-0.9239,-0.7071,0,-0.7071,-1.4142,0,-1.4142],
// 4 16 0 0 -2 0 0 -1 -0.3827 0 -0.9239 -0.7654 0 -1.8478
  [4,16,0,0,-2,0,0,-1,-0.3827,0,-0.9239,-0.7654,0,-1.8478],
// 4 16 0.7654 0 -1.8478 0.3827 0 -0.9239 0 0 -1 0 0 -2
  [4,16,0.7654,0,-1.8478,0.3827,0,-0.9239,0,0,-1,0,0,-2],
// 4 16 1.4142 0 -1.4142 0.7071 0 -0.7071 0.3827 0 -0.9239 0.7654 0 -1.8478
  [4,16,1.4142,0,-1.4142,0.7071,0,-0.7071,0.3827,0,-0.9239,0.7654,0,-1.8478],
// 4 16 1.8478 0 -0.7654 0.9239 0 -0.3827 0.7071 0 -0.7071 1.4142 0 -1.4142
  [4,16,1.8478,0,-0.7654,0.9239,0,-0.3827,0.7071,0,-0.7071,1.4142,0,-1.4142],
// 4 16 2 0 0 1 0 0 0.9239 0 -0.3827 1.8478 0 -0.7654
  [4,16,2,0,0,1,0,0,0.9239,0,-0.3827,1.8478,0,-0.7654],
// 4 16 1.8478 0 0.7654 0.9239 0 0.3827 1 0 0 2 0 0
  [4,16,1.8478,0,0.7654,0.9239,0,0.3827,1,0,0,2,0,0],
// 4 16 1.4142 0 1.4142 0.7071 0 0.7071 0.9239 0 0.3827 1.8478 0 0.7654
  [4,16,1.4142,0,1.4142,0.7071,0,0.7071,0.9239,0,0.3827,1.8478,0,0.7654],
// 4 16 0.7654 0 1.8478 0.3827 0 0.9239 0.7071 0 0.7071 1.4142 0 1.4142
  [4,16,0.7654,0,1.8478,0.3827,0,0.9239,0.7071,0,0.7071,1.4142,0,1.4142],
// 4 16 0 0 2 0 0 1 0.3827 0 0.9239 0.7654 0 1.8478
  [4,16,0,0,2,0,0,1,0.3827,0,0.9239,0.7654,0,1.8478],
// 0
];
makepoly(ldraw_lib__4_4ring1(), line=0.2);
// file: ../p/4-4edge.scad
use <../lib.scad>
function ldraw_lib__4_4edge() = [
// 0 Circle 1.0
// 0 Name: 4-4edge.dat
// 0 Author: James Jessiman
// 0 !LDRAW_ORG Primitive UPDATE 2017-01
// 0 !LICENSE Licensed under CC BY 2.0 and CC BY 4.0 : see CAreadme.txt
// 
// 0 BFC CERTIFY CCW
  [0,"BFC","CERTIFY"],
  [0,"BFC","CCW"],
// 
// 0 !HISTORY 1998-12-15 [PTadmin] Official Update 1998-10
// 0 !HISTORY 2005-12-28 [PTadmin] Official Update 2005-01
// 0 !HISTORY 2007-06-24 [PTadmin] Header formatted for Contributor Agreement
// 0 !HISTORY 2008-07-01 [PTadmin] Official Update 2008-01
// 0 !HISTORY 2017-01-15 [Steffen] BFCed
// 0 !HISTORY 2017-12-30 [PTadmin] Official Update 2017-01
// 
// 
// 2 24 1 0 0 0.9239 0 0.3827
  [2,24,1,0,0,0.9239,0,0.3827],
// 2 24 0.9239 0 0.3827 0.7071 0 0.7071
  [2,24,0.9239,0,0.3827,0.7071,0,0.7071],
// 2 24 0.7071 0 0.7071 0.3827 0 0.9239
  [2,24,0.7071,0,0.7071,0.3827,0,0.9239],
// 2 24 0.3827 0 0.9239 0 0 1
  [2,24,0.3827,0,0.9239,0,0,1],
// 2 24 0 0 1 -0.3827 0 0.9239
  [2,24,0,0,1,-0.3827,0,0.9239],
// 2 24 -0.3827 0 0.9239 -0.7071 0 0.7071
  [2,24,-0.3827,0,0.9239,-0.7071,0,0.7071],
// 2 24 -0.7071 0 0.7071 -0.9239 0 0.3827
  [2,24,-0.7071,0,0.7071,-0.9239,0,0.3827],
// 2 24 -0.9239 0 0.3827 -1 0 -0
  [2,24,-0.9239,0,0.3827,-1,0,-0],
// 2 24 -1 0 -0 -0.9239 0 -0.3827
  [2,24,-1,0,-0,-0.9239,0,-0.3827],
// 2 24 -0.9239 0 -0.3827 -0.7071 0 -0.7071
  [2,24,-0.9239,0,-0.3827,-0.7071,0,-0.7071],
// 2 24 -0.7071 0 -0.7071 -0.3827 0 -0.9239
  [2,24,-0.7071,0,-0.7071,-0.3827,0,-0.9239],
// 2 24 -0.3827 0 -0.9239 0 0 -1
  [2,24,-0.3827,0,-0.9239,0,0,-1],
// 2 24 0 0 -1 0.3827 0 -0.9239
  [2,24,0,0,-1,0.3827,0,-0.9239],
// 2 24 0.3827 0 -0.9239 0.7071 0 -0.7071
  [2,24,0.3827,0,-0.9239,0.7071,0,-0.7071],
// 2 24 0.7071 0 -0.7071 0.9239 0 -0.3827
  [2,24,0.7071,0,-0.7071,0.9239,0,-0.3827],
// 2 24 0.9239 0 -0.3827 1 0 0
  [2,24,0.9239,0,-0.3827,1,0,0],
];
makepoly(ldraw_lib__4_4edge(), line=0.2);
// file: ../p/4-4cylo.scad
use <../lib.scad>
use <4-4cyli.scad>
use <4-4edge.scad>
function ldraw_lib__4_4cylo() = [
// 0 Cylinder Open 1.0
// 0 Name: 4-4cylo.dat
// 0 Author: Mark Kennedy [mkennedy]
// 0 !LDRAW_ORG Primitive UPDATE 2010-01
// 0 !LICENSE Licensed under CC BY 2.0 and CC BY 4.0 : see CAreadme.txt
// 
// 0 BFC CERTIFY CCW
  [0,"BFC","CERTIFY"],
  [0,"BFC","CCW"],
// 
// 0 !HISTORY 2010-04-05 [PTadmin] Official Update 2010-01
// 
// 
// 1 16 0 0 0 1 0 0 0 1 0 0 0 1 4-4edge.dat
  [1,16,0,0,0,1,0,0,0,1,0,0,0,1, ldraw_lib__4_4edge()],
// 1 16 0 1 0 1 0 0 0 1 0 0 0 1 4-4edge.dat
  [1,16,0,1,0,1,0,0,0,1,0,0,0,1, ldraw_lib__4_4edge()],
// 1 16 0 0 0 1 0 0 0 1 0 0 0 1 4-4cyli.dat
  [1,16,0,0,0,1,0,0,0,1,0,0,0,1, ldraw_lib__4_4cyli()],
// 0
];
makepoly(ldraw_lib__4_4cylo(), line=0.2);
// file: ../p/4-4cyli.scad
use <../lib.scad>
function ldraw_lib__4_4cyli() = [
// 0 Cylinder 1.0
// 0 Name: 4-4cyli.dat
// 0 Author: James Jessiman
// 0 !LDRAW_ORG Primitive UPDATE 2005-01
// 0 !LICENSE Licensed under CC BY 2.0 and CC BY 4.0 : see CAreadme.txt
// 
// 0 BFC CERTIFY CCW
  [0,"BFC","CERTIFY"],
  [0,"BFC","CCW"],
// 
// 0 !HISTORY 1998-12-15 [PTadmin] Official Update 1998-10
// 0 !HISTORY 2002-03-23 [sbliss] Added BFC statement; merged headers from files in distributions LDraw 0.27 and Complete.
// 0 !HISTORY 2002-04-25 [PTadmin] Official Update 2002-02
// 0 !HISTORY 2004-12-14 [guyvivan] BFC CCW
// 0 !HISTORY 2005-12-28 [PTadmin] Official Update 2005-01
// 0 !HISTORY 2007-06-24 [PTadmin] Header formatted for Contributor Agreement
// 0 !HISTORY 2008-07-01 [PTadmin] Official Update 2008-01
// 
// 
// 4 16 1 1 0 0.9239 1 0.3827 0.9239 0 0.3827 1 0 0
  [4,16,1,1,0,0.9239,1,0.3827,0.9239,0,0.3827,1,0,0],
// 5 24 1 0 0 1 1 0 0.9239 0 0.3827 0.9239 0 -0.3827
  [5,24,1,0,0,1,1,0,0.9239,0,0.3827,0.9239,0,-0.3827],
// 4 16 0.9239 1 0.3827 0.7071 1 0.7071 0.7071 0 0.7071 0.9239 0 0.3827
  [4,16,0.9239,1,0.3827,0.7071,1,0.7071,0.7071,0,0.7071,0.9239,0,0.3827],
// 5 24 0.9239 0 0.3827 0.9239 1 0.3827 0.7071 0 0.7071 1 0 0
  [5,24,0.9239,0,0.3827,0.9239,1,0.3827,0.7071,0,0.7071,1,0,0],
// 4 16 0.7071 1 0.7071 0.3827 1 0.9239 0.3827 0 0.9239 0.7071 0 0.7071
  [4,16,0.7071,1,0.7071,0.3827,1,0.9239,0.3827,0,0.9239,0.7071,0,0.7071],
// 5 24 0.7071 0 0.7071 0.7071 1 0.7071 0.3827 0 0.9239 0.9239 0 0.3827
  [5,24,0.7071,0,0.7071,0.7071,1,0.7071,0.3827,0,0.9239,0.9239,0,0.3827],
// 4 16 0.3827 1 0.9239 0 1 1 0 0 1 0.3827 0 0.9239
  [4,16,0.3827,1,0.9239,0,1,1,0,0,1,0.3827,0,0.9239],
// 5 24 0.3827 0 0.9239 0.3827 1 0.9239 0 0 1 0.7071 0 0.7071
  [5,24,0.3827,0,0.9239,0.3827,1,0.9239,0,0,1,0.7071,0,0.7071],
// 4 16 0 1 1 -0.3827 1 0.9239 -0.3827 0 0.9239 0 0 1
  [4,16,0,1,1,-0.3827,1,0.9239,-0.3827,0,0.9239,0,0,1],
// 5 24 0 0 1 0 1 1 -0.3827 0 0.9239 0.3827 0 0.9239
  [5,24,0,0,1,0,1,1,-0.3827,0,0.9239,0.3827,0,0.9239],
// 4 16 -0.3827 1 0.9239 -0.7071 1 0.7071 -0.7071 0 0.7071 -0.3827 0 0.9239
  [4,16,-0.3827,1,0.9239,-0.7071,1,0.7071,-0.7071,0,0.7071,-0.3827,0,0.9239],
// 5 24 -0.3827 0 0.9239 -0.3827 1 0.9239 -0.7071 0 0.7071 0 0 1
  [5,24,-0.3827,0,0.9239,-0.3827,1,0.9239,-0.7071,0,0.7071,0,0,1],
// 4 16 -0.7071 1 0.7071 -0.9239 1 0.3827 -0.9239 0 0.3827 -0.7071 0 0.7071
  [4,16,-0.7071,1,0.7071,-0.9239,1,0.3827,-0.9239,0,0.3827,-0.7071,0,0.7071],
// 5 24 -0.7071 0 0.7071 -0.7071 1 0.7071 -0.9239 0 0.3827 -0.3827 0 0.9239
  [5,24,-0.7071,0,0.7071,-0.7071,1,0.7071,-0.9239,0,0.3827,-0.3827,0,0.9239],
// 4 16 -0.9239 1 0.3827 -1 1 0 -1 0 0 -0.9239 0 0.3827
  [4,16,-0.9239,1,0.3827,-1,1,0,-1,0,0,-0.9239,0,0.3827],
// 5 24 -0.9239 0 0.3827 -0.9239 1 0.3827 -1 0 0 -0.7071 0 0.7071
  [5,24,-0.9239,0,0.3827,-0.9239,1,0.3827,-1,0,0,-0.7071,0,0.7071],
// 4 16 -1 1 0 -0.9239 1 -0.3827 -0.9239 0 -0.3827 -1 0 0
  [4,16,-1,1,0,-0.9239,1,-0.3827,-0.9239,0,-0.3827,-1,0,0],
// 5 24 -1 0 0 -1 1 0 -0.9239 0 -0.3827 -0.9239 0 0.3827
  [5,24,-1,0,0,-1,1,0,-0.9239,0,-0.3827,-0.9239,0,0.3827],
// 4 16 -0.9239 1 -0.3827 -0.7071 1 -0.7071 -0.7071 0 -0.7071 -0.9239 0 -0.3827
  [4,16,-0.9239,1,-0.3827,-0.7071,1,-0.7071,-0.7071,0,-0.7071,-0.9239,0,-0.3827],
// 5 24 -0.9239 0 -0.3827 -0.9239 1 -0.3827 -0.7071 0 -0.7071 -1 0 0
  [5,24,-0.9239,0,-0.3827,-0.9239,1,-0.3827,-0.7071,0,-0.7071,-1,0,0],
// 4 16 -0.7071 1 -0.7071 -0.3827 1 -0.9239 -0.3827 0 -0.9239 -0.7071 0 -0.7071
  [4,16,-0.7071,1,-0.7071,-0.3827,1,-0.9239,-0.3827,0,-0.9239,-0.7071,0,-0.7071],
// 5 24 -0.7071 0 -0.7071 -0.7071 1 -0.7071 -0.3827 0 -0.9239 -0.9239 0 -0.3827
  [5,24,-0.7071,0,-0.7071,-0.7071,1,-0.7071,-0.3827,0,-0.9239,-0.9239,0,-0.3827],
// 4 16 -0.3827 1 -0.9239 0 1 -1 0 0 -1 -0.3827 0 -0.9239
  [4,16,-0.3827,1,-0.9239,0,1,-1,0,0,-1,-0.3827,0,-0.9239],
// 5 24 -0.3827 0 -0.9239 -0.3827 1 -0.9239 0 0 -1 -0.7071 0 -0.7071
  [5,24,-0.3827,0,-0.9239,-0.3827,1,-0.9239,0,0,-1,-0.7071,0,-0.7071],
// 4 16 0 1 -1 0.3827 1 -0.9239 0.3827 0 -0.9239 0 0 -1
  [4,16,0,1,-1,0.3827,1,-0.9239,0.3827,0,-0.9239,0,0,-1],
// 5 24 0 0 -1 0 1 -1 0.3827 0 -0.9239 -0.3827 0 -0.9239
  [5,24,0,0,-1,0,1,-1,0.3827,0,-0.9239,-0.3827,0,-0.9239],
// 4 16 0.3827 1 -0.9239 0.7071 1 -0.7071 0.7071 0 -0.7071 0.3827 0 -0.9239
  [4,16,0.3827,1,-0.9239,0.7071,1,-0.7071,0.7071,0,-0.7071,0.3827,0,-0.9239],
// 5 24 0.3827 0 -0.9239 0.3827 1 -0.9239 0.7071 0 -0.7071 0 0 -1
  [5,24,0.3827,0,-0.9239,0.3827,1,-0.9239,0.7071,0,-0.7071,0,0,-1],
// 4 16 0.7071 1 -0.7071 0.9239 1 -0.3827 0.9239 0 -0.3827 0.7071 0 -0.7071
  [4,16,0.7071,1,-0.7071,0.9239,1,-0.3827,0.9239,0,-0.3827,0.7071,0,-0.7071],
// 5 24 0.7071 0 -0.7071 0.7071 1 -0.7071 0.9239 0 -0.3827 0.3827 0 -0.9239
  [5,24,0.7071,0,-0.7071,0.7071,1,-0.7071,0.9239,0,-0.3827,0.3827,0,-0.9239],
// 4 16 0.9239 1 -0.3827 1 1 0 1 0 0 0.9239 0 -0.3827
  [4,16,0.9239,1,-0.3827,1,1,0,1,0,0,0.9239,0,-0.3827],
// 5 24 0.9239 0 -0.3827 0.9239 1 -0.3827 1 0 0 0.7071 0 -0.7071
  [5,24,0.9239,0,-0.3827,0.9239,1,-0.3827,1,0,0,0.7071,0,-0.7071],
// 0
];
makepoly(ldraw_lib__4_4cyli(), line=0.2);
// file: ../p/4-4cylc.scad
use <../lib.scad>
use <4-4cyli.scad>
use <4-4disc.scad>
use <4-4edge.scad>
function ldraw_lib__4_4cylc() = [
// 0 Cylinder Closed 1.0
// 0 Name: 4-4cylc.dat
// 0 Author: Alex Taylor [anathema]
// 0 !LDRAW_ORG Primitive UPDATE 2009-02
// 0 !LICENSE Licensed under CC BY 2.0 and CC BY 4.0 : see CAreadme.txt
// 
// 0 BFC CERTIFY CCW
  [0,"BFC","CERTIFY"],
  [0,"BFC","CCW"],
// 
// 0 !HISTORY 2008-12-29 [cwdee] Removed one disc
// 0 !HISTORY 2009-09-03 [PTadmin] Official Update 2009-02
// 
// 
// 1 16 0 0 0 1 0 0 0 1 0 0 0 1 4-4edge.dat
  [1,16,0,0,0,1,0,0,0,1,0,0,0,1, ldraw_lib__4_4edge()],
// 1 16 0 1 0 1 0 0 0 1 0 0 0 1 4-4edge.dat
  [1,16,0,1,0,1,0,0,0,1,0,0,0,1, ldraw_lib__4_4edge()],
// 1 16 0 0 0 1 0 0 0 1 0 0 0 1 4-4disc.dat
  [1,16,0,0,0,1,0,0,0,1,0,0,0,1, ldraw_lib__4_4disc()],
// 1 16 0 0 0 1 0 0 0 1 0 0 0 1 4-4cyli.dat
  [1,16,0,0,0,1,0,0,0,1,0,0,0,1, ldraw_lib__4_4cyli()],
// 0
];
makepoly(ldraw_lib__4_4cylc(), line=0.2);
// file: 3957a.scad
use <../lib.scad>
use <../p/4-4cylc.scad>
use <../p/4-4cyli.scad>
use <../p/4-4cylo.scad>
use <../p/4-4edge.scad>
use <../p/4-4ring1.scad>
use <../p/4-4ring2.scad>
use <../p/4-4ring3.scad>
use <../p/4-8sphe.scad>
use <../p/stud4a.scad>
function ldraw_lib__3957a() = [
// 0 Antenna  4H with Rounded Top
// 0 Name: 3957a.dat
// 0 Author: James Jessiman
// 0 !LDRAW_ORG Part UPDATE 2015-01
// 0 !LICENSE Licensed under CC BY 2.0 and CC BY 4.0 : see CAreadme.txt
// 
// 0 BFC CERTIFY CCW
  [0,"BFC","CERTIFY"],
  [0,"BFC","CCW"],
// 
// 0 !HISTORY 1998-06-20 [PTadmin] Official Update 1998-06
// 0 !HISTORY 2003-08-01 [PTadmin] Official Update 2003-02
// 0 !HISTORY 2003-08-06 [jriley] BFCed, added inner detail
// 0 !HISTORY 2003-12-19 [PTadmin] Official Update 2003-03
// 0 !HISTORY 2003-12-20 [Steffen] fixed BFC error
// 0 !HISTORY 2004-03-02 [PTadmin] Official Update 2004-01
// 0 !HISTORY 2007-06-30 [PTadmin] Header formatted for Contributor Agreement
// 0 !HISTORY 2008-07-01 [PTadmin] Official Update 2008-01
// 0 !HISTORY 2012-03-13 [PTadmin] Renamed from 3957
// 0 !HISTORY 2012-03-30 [PTadmin] Official Update 2012-01
// 0 !HISTORY 2015-02-10 [MagFors] Redesign without peghole.dat
// 0 !HISTORY 2015-10-11 [PTadmin] Official Update 2015-01
// 
// 
// 1 16 0 -84 0 4 0 0 0 -4 0 0 0 4 4-8sphe.dat
  [1,16,0,-84,0,4,0,0,0,-4,0,0,0,4, ldraw_lib__4_8sphe()],
// 1 16 0 4 0 1 0 0 0 -1 0 0 0 1 stud4a.dat
  [1,16,0,4,0,1,0,0,0,-1,0,0,0,1, ldraw_lib__stud4a()],
// 1 16 0 4 0 6 0 0 0 1 0 0 0 6 4-4edge.dat
  [1,16,0,4,0,6,0,0,0,1,0,0,0,6, ldraw_lib__4_4edge()],
// 1 16 0 4 0 3 0 0 0 -1 0 0 0 3 4-4ring1.dat
  [1,16,0,4,0,3,0,0,0,-1,0,0,0,3, ldraw_lib__4_4ring1()],
// 0 BFC INVERTNEXT
  [0,"BFC","INVERTNEXT"],
// 1 16 0 0 0 3 0 0 0 4 0 0 0 3 4-4cylc.dat
  [1,16,0,0,0,3,0,0,0,4,0,0,0,3, ldraw_lib__4_4cylc()],
// 1 16 0 0 0 8 0 0 0 1 0 0 0 8 4-4edge.dat
  [1,16,0,0,0,8,0,0,0,1,0,0,0,8, ldraw_lib__4_4edge()],
// 1 16 0 0 0 8 0 0 0 4 0 0 0 8 4-4cyli.dat
  [1,16,0,0,0,8,0,0,0,4,0,0,0,8, ldraw_lib__4_4cyli()],
// 1 16 0 0 0 2 0 0 0 1 0 0 0 2 4-4ring3.dat
  [1,16,0,0,0,2,0,0,0,1,0,0,0,2, ldraw_lib__4_4ring3()],
// 1 16 0 -4 0 6 0 0 0 4 0 0 0 6 4-4cylo.dat
  [1,16,0,-4,0,6,0,0,0,4,0,0,0,6, ldraw_lib__4_4cylo()],
// 1 16 0 -4 0 4 0 0 0 1 0 0 0 4 4-4edge.dat
  [1,16,0,-4,0,4,0,0,0,1,0,0,0,4, ldraw_lib__4_4edge()],
// 1 16 0 -4 0 2 0 0 0 1 0 0 0 2 4-4ring2.dat
  [1,16,0,-4,0,2,0,0,0,1,0,0,0,2, ldraw_lib__4_4ring2()],
// 1 16 0 -84 0 4 0 0 0 80 0 0 0 4 4-4cyli.dat
  [1,16,0,-84,0,4,0,0,0,80,0,0,0,4, ldraw_lib__4_4cyli()],
];
makepoly(ldraw_lib__3957a(), line=0.2);
// main file
use <../lib.scad>
use <3957a.scad>
function ldraw_lib__3957() = [
// 0 ~Moved to 3957a
// 0 Name: 3957.dat
// 0 Author: [PTadmin]
// 0 !LDRAW_ORG Part UPDATE 2012-01
// 0 !LICENSE Licensed under CC BY 4.0 : see CAreadme.txt
// 
// 0 BFC CERTIFY CCW
  [0,"BFC","CERTIFY"],
  [0,"BFC","CCW"],
// 
// 0 !HISTORY 2012-03-30 [PTadmin] Official Update 2012-01
// 
// 
// 0 // Antenna 4H
// 1 16 0 0 0 1 0 0 0 1 0 0 0 1 3957a.dat
  [1,16,0,0,0,1,0,0,0,1,0,0,0,1, ldraw_lib__3957a()],
];
makepoly(ldraw_lib__3957(), line=0.2);
